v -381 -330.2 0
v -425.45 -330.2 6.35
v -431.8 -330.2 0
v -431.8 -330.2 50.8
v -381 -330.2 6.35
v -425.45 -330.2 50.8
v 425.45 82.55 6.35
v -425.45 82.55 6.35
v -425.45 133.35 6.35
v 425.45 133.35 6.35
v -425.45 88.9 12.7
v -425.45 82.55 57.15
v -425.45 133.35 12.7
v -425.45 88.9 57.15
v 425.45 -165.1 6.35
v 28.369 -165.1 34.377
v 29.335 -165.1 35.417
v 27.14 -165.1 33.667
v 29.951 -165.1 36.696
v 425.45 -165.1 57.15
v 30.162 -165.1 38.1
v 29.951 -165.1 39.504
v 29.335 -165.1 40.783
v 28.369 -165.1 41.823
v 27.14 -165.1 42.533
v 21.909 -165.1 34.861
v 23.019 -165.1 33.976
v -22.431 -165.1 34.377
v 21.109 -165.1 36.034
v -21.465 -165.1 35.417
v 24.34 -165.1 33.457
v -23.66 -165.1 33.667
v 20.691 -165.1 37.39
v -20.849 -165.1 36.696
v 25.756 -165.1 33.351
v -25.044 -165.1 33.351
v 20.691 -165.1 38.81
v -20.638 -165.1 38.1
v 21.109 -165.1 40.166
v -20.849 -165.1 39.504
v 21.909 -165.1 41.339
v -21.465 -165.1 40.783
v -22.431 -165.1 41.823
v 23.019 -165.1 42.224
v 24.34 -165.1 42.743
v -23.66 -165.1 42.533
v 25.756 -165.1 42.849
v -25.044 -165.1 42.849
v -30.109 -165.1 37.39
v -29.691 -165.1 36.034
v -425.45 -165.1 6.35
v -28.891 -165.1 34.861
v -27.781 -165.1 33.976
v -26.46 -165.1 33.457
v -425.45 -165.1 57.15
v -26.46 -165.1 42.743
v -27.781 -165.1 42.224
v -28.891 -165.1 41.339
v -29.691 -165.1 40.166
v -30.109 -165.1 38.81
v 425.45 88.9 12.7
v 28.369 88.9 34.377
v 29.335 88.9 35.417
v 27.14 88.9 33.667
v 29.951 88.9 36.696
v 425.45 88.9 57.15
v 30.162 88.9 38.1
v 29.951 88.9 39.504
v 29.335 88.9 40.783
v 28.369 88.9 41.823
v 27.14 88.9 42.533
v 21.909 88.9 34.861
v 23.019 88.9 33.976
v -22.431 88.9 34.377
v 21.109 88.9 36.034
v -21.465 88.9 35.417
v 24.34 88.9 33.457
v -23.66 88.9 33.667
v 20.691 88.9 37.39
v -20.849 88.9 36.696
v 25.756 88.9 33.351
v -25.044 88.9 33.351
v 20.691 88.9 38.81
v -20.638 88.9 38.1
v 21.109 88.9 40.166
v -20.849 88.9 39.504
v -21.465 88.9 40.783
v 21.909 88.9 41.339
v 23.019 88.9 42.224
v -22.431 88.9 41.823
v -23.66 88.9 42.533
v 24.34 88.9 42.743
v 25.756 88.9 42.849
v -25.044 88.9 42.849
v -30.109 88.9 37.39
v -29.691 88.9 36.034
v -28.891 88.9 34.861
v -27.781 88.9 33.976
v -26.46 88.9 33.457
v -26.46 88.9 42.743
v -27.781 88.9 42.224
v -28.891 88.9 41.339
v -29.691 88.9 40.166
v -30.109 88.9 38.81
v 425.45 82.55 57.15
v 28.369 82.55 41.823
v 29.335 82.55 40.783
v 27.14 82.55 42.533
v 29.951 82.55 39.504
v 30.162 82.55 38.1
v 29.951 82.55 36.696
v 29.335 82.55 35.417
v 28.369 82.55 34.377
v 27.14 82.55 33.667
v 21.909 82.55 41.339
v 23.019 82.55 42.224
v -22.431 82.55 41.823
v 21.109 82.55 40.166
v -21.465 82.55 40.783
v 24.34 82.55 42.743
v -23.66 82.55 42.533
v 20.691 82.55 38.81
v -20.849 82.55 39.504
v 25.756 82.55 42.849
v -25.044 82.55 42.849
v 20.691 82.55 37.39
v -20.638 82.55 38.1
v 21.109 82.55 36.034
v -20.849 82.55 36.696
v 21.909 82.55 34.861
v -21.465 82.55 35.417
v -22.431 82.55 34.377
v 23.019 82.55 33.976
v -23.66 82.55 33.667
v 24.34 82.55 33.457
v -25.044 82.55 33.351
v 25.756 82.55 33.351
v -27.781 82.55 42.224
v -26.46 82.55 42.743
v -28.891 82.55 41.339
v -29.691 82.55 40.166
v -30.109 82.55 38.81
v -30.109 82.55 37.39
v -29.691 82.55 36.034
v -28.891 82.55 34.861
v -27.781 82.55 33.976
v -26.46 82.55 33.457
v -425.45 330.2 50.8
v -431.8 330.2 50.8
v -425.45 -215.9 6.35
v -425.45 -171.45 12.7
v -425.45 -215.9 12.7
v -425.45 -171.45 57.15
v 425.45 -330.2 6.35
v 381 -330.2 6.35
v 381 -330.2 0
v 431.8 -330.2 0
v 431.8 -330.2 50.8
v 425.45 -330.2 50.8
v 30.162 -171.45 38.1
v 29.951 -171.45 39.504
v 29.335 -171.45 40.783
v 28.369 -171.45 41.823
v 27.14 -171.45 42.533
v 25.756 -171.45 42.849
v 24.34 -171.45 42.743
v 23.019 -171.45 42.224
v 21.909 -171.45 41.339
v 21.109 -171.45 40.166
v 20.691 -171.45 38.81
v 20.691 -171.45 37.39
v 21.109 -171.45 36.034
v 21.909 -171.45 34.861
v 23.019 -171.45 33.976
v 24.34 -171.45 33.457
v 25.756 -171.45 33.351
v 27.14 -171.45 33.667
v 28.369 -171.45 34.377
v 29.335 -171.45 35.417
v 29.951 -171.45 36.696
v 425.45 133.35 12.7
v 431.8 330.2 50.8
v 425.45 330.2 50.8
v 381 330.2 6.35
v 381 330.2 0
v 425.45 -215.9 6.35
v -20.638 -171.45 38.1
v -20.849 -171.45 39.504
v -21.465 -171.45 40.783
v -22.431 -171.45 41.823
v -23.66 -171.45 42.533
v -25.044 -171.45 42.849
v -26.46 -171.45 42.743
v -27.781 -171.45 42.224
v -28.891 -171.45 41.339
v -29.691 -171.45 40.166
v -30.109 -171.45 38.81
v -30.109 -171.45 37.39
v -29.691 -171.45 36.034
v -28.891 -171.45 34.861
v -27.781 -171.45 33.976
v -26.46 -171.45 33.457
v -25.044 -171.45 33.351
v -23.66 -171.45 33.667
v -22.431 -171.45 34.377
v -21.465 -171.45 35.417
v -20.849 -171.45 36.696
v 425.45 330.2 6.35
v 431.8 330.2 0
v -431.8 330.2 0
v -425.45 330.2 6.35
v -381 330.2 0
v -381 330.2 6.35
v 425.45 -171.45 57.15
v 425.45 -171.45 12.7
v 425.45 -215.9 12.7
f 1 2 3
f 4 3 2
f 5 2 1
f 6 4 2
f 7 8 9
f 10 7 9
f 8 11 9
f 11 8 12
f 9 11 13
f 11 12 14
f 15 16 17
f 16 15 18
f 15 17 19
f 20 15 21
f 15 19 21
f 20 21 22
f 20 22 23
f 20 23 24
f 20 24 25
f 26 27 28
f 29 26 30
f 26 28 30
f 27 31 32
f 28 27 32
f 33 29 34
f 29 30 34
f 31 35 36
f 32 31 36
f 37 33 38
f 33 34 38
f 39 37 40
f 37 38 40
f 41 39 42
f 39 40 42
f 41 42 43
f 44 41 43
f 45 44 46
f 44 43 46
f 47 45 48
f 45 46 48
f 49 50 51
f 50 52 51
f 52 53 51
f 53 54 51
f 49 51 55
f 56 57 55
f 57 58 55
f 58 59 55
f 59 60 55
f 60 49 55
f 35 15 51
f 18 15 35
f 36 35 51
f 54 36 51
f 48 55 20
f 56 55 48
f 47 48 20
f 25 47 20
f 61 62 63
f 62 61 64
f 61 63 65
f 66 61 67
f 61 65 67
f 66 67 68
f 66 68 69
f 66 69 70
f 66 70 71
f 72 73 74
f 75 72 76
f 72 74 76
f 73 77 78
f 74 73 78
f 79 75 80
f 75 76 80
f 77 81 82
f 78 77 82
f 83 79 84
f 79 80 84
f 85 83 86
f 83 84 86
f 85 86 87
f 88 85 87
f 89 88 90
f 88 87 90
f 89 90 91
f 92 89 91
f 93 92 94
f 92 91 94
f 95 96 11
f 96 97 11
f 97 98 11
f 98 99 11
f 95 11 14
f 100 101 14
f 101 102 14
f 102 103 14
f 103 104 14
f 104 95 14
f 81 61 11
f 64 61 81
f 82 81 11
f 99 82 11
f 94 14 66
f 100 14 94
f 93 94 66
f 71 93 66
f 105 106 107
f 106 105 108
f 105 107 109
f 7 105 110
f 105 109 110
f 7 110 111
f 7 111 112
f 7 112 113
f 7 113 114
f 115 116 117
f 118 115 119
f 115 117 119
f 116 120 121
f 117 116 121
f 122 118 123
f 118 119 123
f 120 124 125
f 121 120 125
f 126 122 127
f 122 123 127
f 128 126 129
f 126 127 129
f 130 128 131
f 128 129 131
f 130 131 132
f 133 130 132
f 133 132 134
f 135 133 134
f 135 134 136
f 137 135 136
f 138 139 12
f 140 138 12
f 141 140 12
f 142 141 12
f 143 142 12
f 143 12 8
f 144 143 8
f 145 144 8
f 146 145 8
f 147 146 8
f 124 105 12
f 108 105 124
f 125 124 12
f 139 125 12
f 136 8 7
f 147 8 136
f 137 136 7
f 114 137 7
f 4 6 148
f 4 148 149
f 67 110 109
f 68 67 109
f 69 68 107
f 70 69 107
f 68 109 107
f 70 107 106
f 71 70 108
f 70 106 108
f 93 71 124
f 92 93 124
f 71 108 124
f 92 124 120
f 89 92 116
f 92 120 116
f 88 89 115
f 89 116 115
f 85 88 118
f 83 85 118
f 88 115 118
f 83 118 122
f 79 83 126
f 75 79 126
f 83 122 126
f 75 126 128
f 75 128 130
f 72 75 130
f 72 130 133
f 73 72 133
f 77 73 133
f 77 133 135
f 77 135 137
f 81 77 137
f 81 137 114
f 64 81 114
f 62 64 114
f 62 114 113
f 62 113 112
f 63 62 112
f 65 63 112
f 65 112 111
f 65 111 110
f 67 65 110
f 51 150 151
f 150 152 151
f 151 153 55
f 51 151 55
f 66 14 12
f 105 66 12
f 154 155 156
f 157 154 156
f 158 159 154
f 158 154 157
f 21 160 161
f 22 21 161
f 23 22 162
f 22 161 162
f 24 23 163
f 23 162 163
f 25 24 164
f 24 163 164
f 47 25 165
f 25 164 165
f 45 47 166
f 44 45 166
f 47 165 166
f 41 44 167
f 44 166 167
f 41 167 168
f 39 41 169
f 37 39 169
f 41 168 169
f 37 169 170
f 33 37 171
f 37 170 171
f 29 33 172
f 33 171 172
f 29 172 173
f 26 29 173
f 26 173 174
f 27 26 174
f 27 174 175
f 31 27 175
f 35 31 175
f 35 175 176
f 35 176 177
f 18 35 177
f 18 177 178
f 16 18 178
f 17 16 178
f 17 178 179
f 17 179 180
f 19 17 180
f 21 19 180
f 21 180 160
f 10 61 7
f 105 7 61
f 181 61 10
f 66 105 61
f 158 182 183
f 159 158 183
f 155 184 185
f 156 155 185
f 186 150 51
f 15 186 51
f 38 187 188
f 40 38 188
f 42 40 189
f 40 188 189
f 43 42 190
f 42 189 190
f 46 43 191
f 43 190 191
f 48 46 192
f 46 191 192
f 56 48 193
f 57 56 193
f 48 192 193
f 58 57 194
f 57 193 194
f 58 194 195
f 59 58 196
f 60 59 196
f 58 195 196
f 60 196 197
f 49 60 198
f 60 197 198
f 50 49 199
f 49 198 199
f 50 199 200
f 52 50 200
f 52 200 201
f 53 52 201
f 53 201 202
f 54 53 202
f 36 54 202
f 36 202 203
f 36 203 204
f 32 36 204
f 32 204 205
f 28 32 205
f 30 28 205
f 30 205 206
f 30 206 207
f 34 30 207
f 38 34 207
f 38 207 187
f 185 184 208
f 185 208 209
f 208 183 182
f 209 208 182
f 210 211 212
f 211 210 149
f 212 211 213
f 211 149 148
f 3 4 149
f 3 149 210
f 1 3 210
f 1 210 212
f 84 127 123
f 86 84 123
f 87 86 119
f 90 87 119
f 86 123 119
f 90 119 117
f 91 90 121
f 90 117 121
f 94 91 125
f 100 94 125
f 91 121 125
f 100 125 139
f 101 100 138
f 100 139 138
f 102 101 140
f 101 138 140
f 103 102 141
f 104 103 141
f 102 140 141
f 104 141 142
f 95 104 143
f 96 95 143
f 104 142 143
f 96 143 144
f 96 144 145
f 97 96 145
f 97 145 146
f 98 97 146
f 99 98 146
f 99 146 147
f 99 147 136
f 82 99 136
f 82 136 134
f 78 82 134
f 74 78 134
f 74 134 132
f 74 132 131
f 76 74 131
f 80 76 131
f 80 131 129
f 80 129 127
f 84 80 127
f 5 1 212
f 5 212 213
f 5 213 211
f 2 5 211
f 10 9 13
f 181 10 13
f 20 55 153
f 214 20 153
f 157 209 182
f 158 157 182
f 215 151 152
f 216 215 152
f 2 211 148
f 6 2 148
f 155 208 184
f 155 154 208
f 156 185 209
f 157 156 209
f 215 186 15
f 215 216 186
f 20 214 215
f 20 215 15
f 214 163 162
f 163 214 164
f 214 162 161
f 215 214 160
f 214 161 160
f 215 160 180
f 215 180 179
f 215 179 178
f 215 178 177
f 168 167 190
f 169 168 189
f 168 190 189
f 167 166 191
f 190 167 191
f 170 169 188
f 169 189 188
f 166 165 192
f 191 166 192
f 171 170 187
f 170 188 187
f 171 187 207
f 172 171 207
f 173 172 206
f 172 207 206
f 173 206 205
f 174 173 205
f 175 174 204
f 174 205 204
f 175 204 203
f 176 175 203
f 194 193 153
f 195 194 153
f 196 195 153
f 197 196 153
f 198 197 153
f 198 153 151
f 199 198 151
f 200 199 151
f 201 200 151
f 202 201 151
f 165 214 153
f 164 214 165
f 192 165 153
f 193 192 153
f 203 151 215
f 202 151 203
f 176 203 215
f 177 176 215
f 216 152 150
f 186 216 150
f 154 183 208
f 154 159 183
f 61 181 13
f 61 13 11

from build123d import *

# Parameters (mm, degrees)
F1_DEPTH = 330.2
F3_DEPTH = 850.9
F4_R     = 4.7625
F5_DEPTH = 501.651


with BuildPart() as f1:
    # F0 (on Front) → F1 (new body, symmetric)
    with BuildSketch(Plane.XZ):
        Polygon((-425.45, 50.8), (-431.8, 50.8), (-431.8, 0), (-381, 0), (-381, 6.35), (-425.45, 6.35), align=None)
        Polygon((381, 6.35), (381, 0), (431.8, 0), (431.8, 50.8), (425.45, 50.8), (425.45, 6.35), align=None)
    extrude(amount=F1_DEPTH, both=True)


with BuildPart() as f3:
    # F2 (on face) → F3 (new body, through all)
    with BuildSketch(Plane.YZ.offset(-425.45)):
        Polygon((-215.9, 6.35), (-165.1, 6.35), (-165.1, 57.15), (-171.45, 57.15), (-171.45, 12.7), (-215.9, 12.7), align=None)
        Polygon((88.9, 57.15), (82.55, 57.15), (82.55, 6.35), (133.35, 6.35), (133.35, 12.7), (88.9, 12.7), align=None)
    extrude(amount=F3_DEPTH)

    # F4 (on face) → F5 (cut, through all)
    with BuildSketch(Plane.XZ.offset(171.45)):
        with Locations((-25.4, 38.1)):
            Circle(F4_R)
        with Locations((25.4, 38.1)):
            Circle(F4_R)
    extrude(amount=-F5_DEPTH, mode=Mode.SUBTRACT)


solid = Compound([f1.part, f3.part])
